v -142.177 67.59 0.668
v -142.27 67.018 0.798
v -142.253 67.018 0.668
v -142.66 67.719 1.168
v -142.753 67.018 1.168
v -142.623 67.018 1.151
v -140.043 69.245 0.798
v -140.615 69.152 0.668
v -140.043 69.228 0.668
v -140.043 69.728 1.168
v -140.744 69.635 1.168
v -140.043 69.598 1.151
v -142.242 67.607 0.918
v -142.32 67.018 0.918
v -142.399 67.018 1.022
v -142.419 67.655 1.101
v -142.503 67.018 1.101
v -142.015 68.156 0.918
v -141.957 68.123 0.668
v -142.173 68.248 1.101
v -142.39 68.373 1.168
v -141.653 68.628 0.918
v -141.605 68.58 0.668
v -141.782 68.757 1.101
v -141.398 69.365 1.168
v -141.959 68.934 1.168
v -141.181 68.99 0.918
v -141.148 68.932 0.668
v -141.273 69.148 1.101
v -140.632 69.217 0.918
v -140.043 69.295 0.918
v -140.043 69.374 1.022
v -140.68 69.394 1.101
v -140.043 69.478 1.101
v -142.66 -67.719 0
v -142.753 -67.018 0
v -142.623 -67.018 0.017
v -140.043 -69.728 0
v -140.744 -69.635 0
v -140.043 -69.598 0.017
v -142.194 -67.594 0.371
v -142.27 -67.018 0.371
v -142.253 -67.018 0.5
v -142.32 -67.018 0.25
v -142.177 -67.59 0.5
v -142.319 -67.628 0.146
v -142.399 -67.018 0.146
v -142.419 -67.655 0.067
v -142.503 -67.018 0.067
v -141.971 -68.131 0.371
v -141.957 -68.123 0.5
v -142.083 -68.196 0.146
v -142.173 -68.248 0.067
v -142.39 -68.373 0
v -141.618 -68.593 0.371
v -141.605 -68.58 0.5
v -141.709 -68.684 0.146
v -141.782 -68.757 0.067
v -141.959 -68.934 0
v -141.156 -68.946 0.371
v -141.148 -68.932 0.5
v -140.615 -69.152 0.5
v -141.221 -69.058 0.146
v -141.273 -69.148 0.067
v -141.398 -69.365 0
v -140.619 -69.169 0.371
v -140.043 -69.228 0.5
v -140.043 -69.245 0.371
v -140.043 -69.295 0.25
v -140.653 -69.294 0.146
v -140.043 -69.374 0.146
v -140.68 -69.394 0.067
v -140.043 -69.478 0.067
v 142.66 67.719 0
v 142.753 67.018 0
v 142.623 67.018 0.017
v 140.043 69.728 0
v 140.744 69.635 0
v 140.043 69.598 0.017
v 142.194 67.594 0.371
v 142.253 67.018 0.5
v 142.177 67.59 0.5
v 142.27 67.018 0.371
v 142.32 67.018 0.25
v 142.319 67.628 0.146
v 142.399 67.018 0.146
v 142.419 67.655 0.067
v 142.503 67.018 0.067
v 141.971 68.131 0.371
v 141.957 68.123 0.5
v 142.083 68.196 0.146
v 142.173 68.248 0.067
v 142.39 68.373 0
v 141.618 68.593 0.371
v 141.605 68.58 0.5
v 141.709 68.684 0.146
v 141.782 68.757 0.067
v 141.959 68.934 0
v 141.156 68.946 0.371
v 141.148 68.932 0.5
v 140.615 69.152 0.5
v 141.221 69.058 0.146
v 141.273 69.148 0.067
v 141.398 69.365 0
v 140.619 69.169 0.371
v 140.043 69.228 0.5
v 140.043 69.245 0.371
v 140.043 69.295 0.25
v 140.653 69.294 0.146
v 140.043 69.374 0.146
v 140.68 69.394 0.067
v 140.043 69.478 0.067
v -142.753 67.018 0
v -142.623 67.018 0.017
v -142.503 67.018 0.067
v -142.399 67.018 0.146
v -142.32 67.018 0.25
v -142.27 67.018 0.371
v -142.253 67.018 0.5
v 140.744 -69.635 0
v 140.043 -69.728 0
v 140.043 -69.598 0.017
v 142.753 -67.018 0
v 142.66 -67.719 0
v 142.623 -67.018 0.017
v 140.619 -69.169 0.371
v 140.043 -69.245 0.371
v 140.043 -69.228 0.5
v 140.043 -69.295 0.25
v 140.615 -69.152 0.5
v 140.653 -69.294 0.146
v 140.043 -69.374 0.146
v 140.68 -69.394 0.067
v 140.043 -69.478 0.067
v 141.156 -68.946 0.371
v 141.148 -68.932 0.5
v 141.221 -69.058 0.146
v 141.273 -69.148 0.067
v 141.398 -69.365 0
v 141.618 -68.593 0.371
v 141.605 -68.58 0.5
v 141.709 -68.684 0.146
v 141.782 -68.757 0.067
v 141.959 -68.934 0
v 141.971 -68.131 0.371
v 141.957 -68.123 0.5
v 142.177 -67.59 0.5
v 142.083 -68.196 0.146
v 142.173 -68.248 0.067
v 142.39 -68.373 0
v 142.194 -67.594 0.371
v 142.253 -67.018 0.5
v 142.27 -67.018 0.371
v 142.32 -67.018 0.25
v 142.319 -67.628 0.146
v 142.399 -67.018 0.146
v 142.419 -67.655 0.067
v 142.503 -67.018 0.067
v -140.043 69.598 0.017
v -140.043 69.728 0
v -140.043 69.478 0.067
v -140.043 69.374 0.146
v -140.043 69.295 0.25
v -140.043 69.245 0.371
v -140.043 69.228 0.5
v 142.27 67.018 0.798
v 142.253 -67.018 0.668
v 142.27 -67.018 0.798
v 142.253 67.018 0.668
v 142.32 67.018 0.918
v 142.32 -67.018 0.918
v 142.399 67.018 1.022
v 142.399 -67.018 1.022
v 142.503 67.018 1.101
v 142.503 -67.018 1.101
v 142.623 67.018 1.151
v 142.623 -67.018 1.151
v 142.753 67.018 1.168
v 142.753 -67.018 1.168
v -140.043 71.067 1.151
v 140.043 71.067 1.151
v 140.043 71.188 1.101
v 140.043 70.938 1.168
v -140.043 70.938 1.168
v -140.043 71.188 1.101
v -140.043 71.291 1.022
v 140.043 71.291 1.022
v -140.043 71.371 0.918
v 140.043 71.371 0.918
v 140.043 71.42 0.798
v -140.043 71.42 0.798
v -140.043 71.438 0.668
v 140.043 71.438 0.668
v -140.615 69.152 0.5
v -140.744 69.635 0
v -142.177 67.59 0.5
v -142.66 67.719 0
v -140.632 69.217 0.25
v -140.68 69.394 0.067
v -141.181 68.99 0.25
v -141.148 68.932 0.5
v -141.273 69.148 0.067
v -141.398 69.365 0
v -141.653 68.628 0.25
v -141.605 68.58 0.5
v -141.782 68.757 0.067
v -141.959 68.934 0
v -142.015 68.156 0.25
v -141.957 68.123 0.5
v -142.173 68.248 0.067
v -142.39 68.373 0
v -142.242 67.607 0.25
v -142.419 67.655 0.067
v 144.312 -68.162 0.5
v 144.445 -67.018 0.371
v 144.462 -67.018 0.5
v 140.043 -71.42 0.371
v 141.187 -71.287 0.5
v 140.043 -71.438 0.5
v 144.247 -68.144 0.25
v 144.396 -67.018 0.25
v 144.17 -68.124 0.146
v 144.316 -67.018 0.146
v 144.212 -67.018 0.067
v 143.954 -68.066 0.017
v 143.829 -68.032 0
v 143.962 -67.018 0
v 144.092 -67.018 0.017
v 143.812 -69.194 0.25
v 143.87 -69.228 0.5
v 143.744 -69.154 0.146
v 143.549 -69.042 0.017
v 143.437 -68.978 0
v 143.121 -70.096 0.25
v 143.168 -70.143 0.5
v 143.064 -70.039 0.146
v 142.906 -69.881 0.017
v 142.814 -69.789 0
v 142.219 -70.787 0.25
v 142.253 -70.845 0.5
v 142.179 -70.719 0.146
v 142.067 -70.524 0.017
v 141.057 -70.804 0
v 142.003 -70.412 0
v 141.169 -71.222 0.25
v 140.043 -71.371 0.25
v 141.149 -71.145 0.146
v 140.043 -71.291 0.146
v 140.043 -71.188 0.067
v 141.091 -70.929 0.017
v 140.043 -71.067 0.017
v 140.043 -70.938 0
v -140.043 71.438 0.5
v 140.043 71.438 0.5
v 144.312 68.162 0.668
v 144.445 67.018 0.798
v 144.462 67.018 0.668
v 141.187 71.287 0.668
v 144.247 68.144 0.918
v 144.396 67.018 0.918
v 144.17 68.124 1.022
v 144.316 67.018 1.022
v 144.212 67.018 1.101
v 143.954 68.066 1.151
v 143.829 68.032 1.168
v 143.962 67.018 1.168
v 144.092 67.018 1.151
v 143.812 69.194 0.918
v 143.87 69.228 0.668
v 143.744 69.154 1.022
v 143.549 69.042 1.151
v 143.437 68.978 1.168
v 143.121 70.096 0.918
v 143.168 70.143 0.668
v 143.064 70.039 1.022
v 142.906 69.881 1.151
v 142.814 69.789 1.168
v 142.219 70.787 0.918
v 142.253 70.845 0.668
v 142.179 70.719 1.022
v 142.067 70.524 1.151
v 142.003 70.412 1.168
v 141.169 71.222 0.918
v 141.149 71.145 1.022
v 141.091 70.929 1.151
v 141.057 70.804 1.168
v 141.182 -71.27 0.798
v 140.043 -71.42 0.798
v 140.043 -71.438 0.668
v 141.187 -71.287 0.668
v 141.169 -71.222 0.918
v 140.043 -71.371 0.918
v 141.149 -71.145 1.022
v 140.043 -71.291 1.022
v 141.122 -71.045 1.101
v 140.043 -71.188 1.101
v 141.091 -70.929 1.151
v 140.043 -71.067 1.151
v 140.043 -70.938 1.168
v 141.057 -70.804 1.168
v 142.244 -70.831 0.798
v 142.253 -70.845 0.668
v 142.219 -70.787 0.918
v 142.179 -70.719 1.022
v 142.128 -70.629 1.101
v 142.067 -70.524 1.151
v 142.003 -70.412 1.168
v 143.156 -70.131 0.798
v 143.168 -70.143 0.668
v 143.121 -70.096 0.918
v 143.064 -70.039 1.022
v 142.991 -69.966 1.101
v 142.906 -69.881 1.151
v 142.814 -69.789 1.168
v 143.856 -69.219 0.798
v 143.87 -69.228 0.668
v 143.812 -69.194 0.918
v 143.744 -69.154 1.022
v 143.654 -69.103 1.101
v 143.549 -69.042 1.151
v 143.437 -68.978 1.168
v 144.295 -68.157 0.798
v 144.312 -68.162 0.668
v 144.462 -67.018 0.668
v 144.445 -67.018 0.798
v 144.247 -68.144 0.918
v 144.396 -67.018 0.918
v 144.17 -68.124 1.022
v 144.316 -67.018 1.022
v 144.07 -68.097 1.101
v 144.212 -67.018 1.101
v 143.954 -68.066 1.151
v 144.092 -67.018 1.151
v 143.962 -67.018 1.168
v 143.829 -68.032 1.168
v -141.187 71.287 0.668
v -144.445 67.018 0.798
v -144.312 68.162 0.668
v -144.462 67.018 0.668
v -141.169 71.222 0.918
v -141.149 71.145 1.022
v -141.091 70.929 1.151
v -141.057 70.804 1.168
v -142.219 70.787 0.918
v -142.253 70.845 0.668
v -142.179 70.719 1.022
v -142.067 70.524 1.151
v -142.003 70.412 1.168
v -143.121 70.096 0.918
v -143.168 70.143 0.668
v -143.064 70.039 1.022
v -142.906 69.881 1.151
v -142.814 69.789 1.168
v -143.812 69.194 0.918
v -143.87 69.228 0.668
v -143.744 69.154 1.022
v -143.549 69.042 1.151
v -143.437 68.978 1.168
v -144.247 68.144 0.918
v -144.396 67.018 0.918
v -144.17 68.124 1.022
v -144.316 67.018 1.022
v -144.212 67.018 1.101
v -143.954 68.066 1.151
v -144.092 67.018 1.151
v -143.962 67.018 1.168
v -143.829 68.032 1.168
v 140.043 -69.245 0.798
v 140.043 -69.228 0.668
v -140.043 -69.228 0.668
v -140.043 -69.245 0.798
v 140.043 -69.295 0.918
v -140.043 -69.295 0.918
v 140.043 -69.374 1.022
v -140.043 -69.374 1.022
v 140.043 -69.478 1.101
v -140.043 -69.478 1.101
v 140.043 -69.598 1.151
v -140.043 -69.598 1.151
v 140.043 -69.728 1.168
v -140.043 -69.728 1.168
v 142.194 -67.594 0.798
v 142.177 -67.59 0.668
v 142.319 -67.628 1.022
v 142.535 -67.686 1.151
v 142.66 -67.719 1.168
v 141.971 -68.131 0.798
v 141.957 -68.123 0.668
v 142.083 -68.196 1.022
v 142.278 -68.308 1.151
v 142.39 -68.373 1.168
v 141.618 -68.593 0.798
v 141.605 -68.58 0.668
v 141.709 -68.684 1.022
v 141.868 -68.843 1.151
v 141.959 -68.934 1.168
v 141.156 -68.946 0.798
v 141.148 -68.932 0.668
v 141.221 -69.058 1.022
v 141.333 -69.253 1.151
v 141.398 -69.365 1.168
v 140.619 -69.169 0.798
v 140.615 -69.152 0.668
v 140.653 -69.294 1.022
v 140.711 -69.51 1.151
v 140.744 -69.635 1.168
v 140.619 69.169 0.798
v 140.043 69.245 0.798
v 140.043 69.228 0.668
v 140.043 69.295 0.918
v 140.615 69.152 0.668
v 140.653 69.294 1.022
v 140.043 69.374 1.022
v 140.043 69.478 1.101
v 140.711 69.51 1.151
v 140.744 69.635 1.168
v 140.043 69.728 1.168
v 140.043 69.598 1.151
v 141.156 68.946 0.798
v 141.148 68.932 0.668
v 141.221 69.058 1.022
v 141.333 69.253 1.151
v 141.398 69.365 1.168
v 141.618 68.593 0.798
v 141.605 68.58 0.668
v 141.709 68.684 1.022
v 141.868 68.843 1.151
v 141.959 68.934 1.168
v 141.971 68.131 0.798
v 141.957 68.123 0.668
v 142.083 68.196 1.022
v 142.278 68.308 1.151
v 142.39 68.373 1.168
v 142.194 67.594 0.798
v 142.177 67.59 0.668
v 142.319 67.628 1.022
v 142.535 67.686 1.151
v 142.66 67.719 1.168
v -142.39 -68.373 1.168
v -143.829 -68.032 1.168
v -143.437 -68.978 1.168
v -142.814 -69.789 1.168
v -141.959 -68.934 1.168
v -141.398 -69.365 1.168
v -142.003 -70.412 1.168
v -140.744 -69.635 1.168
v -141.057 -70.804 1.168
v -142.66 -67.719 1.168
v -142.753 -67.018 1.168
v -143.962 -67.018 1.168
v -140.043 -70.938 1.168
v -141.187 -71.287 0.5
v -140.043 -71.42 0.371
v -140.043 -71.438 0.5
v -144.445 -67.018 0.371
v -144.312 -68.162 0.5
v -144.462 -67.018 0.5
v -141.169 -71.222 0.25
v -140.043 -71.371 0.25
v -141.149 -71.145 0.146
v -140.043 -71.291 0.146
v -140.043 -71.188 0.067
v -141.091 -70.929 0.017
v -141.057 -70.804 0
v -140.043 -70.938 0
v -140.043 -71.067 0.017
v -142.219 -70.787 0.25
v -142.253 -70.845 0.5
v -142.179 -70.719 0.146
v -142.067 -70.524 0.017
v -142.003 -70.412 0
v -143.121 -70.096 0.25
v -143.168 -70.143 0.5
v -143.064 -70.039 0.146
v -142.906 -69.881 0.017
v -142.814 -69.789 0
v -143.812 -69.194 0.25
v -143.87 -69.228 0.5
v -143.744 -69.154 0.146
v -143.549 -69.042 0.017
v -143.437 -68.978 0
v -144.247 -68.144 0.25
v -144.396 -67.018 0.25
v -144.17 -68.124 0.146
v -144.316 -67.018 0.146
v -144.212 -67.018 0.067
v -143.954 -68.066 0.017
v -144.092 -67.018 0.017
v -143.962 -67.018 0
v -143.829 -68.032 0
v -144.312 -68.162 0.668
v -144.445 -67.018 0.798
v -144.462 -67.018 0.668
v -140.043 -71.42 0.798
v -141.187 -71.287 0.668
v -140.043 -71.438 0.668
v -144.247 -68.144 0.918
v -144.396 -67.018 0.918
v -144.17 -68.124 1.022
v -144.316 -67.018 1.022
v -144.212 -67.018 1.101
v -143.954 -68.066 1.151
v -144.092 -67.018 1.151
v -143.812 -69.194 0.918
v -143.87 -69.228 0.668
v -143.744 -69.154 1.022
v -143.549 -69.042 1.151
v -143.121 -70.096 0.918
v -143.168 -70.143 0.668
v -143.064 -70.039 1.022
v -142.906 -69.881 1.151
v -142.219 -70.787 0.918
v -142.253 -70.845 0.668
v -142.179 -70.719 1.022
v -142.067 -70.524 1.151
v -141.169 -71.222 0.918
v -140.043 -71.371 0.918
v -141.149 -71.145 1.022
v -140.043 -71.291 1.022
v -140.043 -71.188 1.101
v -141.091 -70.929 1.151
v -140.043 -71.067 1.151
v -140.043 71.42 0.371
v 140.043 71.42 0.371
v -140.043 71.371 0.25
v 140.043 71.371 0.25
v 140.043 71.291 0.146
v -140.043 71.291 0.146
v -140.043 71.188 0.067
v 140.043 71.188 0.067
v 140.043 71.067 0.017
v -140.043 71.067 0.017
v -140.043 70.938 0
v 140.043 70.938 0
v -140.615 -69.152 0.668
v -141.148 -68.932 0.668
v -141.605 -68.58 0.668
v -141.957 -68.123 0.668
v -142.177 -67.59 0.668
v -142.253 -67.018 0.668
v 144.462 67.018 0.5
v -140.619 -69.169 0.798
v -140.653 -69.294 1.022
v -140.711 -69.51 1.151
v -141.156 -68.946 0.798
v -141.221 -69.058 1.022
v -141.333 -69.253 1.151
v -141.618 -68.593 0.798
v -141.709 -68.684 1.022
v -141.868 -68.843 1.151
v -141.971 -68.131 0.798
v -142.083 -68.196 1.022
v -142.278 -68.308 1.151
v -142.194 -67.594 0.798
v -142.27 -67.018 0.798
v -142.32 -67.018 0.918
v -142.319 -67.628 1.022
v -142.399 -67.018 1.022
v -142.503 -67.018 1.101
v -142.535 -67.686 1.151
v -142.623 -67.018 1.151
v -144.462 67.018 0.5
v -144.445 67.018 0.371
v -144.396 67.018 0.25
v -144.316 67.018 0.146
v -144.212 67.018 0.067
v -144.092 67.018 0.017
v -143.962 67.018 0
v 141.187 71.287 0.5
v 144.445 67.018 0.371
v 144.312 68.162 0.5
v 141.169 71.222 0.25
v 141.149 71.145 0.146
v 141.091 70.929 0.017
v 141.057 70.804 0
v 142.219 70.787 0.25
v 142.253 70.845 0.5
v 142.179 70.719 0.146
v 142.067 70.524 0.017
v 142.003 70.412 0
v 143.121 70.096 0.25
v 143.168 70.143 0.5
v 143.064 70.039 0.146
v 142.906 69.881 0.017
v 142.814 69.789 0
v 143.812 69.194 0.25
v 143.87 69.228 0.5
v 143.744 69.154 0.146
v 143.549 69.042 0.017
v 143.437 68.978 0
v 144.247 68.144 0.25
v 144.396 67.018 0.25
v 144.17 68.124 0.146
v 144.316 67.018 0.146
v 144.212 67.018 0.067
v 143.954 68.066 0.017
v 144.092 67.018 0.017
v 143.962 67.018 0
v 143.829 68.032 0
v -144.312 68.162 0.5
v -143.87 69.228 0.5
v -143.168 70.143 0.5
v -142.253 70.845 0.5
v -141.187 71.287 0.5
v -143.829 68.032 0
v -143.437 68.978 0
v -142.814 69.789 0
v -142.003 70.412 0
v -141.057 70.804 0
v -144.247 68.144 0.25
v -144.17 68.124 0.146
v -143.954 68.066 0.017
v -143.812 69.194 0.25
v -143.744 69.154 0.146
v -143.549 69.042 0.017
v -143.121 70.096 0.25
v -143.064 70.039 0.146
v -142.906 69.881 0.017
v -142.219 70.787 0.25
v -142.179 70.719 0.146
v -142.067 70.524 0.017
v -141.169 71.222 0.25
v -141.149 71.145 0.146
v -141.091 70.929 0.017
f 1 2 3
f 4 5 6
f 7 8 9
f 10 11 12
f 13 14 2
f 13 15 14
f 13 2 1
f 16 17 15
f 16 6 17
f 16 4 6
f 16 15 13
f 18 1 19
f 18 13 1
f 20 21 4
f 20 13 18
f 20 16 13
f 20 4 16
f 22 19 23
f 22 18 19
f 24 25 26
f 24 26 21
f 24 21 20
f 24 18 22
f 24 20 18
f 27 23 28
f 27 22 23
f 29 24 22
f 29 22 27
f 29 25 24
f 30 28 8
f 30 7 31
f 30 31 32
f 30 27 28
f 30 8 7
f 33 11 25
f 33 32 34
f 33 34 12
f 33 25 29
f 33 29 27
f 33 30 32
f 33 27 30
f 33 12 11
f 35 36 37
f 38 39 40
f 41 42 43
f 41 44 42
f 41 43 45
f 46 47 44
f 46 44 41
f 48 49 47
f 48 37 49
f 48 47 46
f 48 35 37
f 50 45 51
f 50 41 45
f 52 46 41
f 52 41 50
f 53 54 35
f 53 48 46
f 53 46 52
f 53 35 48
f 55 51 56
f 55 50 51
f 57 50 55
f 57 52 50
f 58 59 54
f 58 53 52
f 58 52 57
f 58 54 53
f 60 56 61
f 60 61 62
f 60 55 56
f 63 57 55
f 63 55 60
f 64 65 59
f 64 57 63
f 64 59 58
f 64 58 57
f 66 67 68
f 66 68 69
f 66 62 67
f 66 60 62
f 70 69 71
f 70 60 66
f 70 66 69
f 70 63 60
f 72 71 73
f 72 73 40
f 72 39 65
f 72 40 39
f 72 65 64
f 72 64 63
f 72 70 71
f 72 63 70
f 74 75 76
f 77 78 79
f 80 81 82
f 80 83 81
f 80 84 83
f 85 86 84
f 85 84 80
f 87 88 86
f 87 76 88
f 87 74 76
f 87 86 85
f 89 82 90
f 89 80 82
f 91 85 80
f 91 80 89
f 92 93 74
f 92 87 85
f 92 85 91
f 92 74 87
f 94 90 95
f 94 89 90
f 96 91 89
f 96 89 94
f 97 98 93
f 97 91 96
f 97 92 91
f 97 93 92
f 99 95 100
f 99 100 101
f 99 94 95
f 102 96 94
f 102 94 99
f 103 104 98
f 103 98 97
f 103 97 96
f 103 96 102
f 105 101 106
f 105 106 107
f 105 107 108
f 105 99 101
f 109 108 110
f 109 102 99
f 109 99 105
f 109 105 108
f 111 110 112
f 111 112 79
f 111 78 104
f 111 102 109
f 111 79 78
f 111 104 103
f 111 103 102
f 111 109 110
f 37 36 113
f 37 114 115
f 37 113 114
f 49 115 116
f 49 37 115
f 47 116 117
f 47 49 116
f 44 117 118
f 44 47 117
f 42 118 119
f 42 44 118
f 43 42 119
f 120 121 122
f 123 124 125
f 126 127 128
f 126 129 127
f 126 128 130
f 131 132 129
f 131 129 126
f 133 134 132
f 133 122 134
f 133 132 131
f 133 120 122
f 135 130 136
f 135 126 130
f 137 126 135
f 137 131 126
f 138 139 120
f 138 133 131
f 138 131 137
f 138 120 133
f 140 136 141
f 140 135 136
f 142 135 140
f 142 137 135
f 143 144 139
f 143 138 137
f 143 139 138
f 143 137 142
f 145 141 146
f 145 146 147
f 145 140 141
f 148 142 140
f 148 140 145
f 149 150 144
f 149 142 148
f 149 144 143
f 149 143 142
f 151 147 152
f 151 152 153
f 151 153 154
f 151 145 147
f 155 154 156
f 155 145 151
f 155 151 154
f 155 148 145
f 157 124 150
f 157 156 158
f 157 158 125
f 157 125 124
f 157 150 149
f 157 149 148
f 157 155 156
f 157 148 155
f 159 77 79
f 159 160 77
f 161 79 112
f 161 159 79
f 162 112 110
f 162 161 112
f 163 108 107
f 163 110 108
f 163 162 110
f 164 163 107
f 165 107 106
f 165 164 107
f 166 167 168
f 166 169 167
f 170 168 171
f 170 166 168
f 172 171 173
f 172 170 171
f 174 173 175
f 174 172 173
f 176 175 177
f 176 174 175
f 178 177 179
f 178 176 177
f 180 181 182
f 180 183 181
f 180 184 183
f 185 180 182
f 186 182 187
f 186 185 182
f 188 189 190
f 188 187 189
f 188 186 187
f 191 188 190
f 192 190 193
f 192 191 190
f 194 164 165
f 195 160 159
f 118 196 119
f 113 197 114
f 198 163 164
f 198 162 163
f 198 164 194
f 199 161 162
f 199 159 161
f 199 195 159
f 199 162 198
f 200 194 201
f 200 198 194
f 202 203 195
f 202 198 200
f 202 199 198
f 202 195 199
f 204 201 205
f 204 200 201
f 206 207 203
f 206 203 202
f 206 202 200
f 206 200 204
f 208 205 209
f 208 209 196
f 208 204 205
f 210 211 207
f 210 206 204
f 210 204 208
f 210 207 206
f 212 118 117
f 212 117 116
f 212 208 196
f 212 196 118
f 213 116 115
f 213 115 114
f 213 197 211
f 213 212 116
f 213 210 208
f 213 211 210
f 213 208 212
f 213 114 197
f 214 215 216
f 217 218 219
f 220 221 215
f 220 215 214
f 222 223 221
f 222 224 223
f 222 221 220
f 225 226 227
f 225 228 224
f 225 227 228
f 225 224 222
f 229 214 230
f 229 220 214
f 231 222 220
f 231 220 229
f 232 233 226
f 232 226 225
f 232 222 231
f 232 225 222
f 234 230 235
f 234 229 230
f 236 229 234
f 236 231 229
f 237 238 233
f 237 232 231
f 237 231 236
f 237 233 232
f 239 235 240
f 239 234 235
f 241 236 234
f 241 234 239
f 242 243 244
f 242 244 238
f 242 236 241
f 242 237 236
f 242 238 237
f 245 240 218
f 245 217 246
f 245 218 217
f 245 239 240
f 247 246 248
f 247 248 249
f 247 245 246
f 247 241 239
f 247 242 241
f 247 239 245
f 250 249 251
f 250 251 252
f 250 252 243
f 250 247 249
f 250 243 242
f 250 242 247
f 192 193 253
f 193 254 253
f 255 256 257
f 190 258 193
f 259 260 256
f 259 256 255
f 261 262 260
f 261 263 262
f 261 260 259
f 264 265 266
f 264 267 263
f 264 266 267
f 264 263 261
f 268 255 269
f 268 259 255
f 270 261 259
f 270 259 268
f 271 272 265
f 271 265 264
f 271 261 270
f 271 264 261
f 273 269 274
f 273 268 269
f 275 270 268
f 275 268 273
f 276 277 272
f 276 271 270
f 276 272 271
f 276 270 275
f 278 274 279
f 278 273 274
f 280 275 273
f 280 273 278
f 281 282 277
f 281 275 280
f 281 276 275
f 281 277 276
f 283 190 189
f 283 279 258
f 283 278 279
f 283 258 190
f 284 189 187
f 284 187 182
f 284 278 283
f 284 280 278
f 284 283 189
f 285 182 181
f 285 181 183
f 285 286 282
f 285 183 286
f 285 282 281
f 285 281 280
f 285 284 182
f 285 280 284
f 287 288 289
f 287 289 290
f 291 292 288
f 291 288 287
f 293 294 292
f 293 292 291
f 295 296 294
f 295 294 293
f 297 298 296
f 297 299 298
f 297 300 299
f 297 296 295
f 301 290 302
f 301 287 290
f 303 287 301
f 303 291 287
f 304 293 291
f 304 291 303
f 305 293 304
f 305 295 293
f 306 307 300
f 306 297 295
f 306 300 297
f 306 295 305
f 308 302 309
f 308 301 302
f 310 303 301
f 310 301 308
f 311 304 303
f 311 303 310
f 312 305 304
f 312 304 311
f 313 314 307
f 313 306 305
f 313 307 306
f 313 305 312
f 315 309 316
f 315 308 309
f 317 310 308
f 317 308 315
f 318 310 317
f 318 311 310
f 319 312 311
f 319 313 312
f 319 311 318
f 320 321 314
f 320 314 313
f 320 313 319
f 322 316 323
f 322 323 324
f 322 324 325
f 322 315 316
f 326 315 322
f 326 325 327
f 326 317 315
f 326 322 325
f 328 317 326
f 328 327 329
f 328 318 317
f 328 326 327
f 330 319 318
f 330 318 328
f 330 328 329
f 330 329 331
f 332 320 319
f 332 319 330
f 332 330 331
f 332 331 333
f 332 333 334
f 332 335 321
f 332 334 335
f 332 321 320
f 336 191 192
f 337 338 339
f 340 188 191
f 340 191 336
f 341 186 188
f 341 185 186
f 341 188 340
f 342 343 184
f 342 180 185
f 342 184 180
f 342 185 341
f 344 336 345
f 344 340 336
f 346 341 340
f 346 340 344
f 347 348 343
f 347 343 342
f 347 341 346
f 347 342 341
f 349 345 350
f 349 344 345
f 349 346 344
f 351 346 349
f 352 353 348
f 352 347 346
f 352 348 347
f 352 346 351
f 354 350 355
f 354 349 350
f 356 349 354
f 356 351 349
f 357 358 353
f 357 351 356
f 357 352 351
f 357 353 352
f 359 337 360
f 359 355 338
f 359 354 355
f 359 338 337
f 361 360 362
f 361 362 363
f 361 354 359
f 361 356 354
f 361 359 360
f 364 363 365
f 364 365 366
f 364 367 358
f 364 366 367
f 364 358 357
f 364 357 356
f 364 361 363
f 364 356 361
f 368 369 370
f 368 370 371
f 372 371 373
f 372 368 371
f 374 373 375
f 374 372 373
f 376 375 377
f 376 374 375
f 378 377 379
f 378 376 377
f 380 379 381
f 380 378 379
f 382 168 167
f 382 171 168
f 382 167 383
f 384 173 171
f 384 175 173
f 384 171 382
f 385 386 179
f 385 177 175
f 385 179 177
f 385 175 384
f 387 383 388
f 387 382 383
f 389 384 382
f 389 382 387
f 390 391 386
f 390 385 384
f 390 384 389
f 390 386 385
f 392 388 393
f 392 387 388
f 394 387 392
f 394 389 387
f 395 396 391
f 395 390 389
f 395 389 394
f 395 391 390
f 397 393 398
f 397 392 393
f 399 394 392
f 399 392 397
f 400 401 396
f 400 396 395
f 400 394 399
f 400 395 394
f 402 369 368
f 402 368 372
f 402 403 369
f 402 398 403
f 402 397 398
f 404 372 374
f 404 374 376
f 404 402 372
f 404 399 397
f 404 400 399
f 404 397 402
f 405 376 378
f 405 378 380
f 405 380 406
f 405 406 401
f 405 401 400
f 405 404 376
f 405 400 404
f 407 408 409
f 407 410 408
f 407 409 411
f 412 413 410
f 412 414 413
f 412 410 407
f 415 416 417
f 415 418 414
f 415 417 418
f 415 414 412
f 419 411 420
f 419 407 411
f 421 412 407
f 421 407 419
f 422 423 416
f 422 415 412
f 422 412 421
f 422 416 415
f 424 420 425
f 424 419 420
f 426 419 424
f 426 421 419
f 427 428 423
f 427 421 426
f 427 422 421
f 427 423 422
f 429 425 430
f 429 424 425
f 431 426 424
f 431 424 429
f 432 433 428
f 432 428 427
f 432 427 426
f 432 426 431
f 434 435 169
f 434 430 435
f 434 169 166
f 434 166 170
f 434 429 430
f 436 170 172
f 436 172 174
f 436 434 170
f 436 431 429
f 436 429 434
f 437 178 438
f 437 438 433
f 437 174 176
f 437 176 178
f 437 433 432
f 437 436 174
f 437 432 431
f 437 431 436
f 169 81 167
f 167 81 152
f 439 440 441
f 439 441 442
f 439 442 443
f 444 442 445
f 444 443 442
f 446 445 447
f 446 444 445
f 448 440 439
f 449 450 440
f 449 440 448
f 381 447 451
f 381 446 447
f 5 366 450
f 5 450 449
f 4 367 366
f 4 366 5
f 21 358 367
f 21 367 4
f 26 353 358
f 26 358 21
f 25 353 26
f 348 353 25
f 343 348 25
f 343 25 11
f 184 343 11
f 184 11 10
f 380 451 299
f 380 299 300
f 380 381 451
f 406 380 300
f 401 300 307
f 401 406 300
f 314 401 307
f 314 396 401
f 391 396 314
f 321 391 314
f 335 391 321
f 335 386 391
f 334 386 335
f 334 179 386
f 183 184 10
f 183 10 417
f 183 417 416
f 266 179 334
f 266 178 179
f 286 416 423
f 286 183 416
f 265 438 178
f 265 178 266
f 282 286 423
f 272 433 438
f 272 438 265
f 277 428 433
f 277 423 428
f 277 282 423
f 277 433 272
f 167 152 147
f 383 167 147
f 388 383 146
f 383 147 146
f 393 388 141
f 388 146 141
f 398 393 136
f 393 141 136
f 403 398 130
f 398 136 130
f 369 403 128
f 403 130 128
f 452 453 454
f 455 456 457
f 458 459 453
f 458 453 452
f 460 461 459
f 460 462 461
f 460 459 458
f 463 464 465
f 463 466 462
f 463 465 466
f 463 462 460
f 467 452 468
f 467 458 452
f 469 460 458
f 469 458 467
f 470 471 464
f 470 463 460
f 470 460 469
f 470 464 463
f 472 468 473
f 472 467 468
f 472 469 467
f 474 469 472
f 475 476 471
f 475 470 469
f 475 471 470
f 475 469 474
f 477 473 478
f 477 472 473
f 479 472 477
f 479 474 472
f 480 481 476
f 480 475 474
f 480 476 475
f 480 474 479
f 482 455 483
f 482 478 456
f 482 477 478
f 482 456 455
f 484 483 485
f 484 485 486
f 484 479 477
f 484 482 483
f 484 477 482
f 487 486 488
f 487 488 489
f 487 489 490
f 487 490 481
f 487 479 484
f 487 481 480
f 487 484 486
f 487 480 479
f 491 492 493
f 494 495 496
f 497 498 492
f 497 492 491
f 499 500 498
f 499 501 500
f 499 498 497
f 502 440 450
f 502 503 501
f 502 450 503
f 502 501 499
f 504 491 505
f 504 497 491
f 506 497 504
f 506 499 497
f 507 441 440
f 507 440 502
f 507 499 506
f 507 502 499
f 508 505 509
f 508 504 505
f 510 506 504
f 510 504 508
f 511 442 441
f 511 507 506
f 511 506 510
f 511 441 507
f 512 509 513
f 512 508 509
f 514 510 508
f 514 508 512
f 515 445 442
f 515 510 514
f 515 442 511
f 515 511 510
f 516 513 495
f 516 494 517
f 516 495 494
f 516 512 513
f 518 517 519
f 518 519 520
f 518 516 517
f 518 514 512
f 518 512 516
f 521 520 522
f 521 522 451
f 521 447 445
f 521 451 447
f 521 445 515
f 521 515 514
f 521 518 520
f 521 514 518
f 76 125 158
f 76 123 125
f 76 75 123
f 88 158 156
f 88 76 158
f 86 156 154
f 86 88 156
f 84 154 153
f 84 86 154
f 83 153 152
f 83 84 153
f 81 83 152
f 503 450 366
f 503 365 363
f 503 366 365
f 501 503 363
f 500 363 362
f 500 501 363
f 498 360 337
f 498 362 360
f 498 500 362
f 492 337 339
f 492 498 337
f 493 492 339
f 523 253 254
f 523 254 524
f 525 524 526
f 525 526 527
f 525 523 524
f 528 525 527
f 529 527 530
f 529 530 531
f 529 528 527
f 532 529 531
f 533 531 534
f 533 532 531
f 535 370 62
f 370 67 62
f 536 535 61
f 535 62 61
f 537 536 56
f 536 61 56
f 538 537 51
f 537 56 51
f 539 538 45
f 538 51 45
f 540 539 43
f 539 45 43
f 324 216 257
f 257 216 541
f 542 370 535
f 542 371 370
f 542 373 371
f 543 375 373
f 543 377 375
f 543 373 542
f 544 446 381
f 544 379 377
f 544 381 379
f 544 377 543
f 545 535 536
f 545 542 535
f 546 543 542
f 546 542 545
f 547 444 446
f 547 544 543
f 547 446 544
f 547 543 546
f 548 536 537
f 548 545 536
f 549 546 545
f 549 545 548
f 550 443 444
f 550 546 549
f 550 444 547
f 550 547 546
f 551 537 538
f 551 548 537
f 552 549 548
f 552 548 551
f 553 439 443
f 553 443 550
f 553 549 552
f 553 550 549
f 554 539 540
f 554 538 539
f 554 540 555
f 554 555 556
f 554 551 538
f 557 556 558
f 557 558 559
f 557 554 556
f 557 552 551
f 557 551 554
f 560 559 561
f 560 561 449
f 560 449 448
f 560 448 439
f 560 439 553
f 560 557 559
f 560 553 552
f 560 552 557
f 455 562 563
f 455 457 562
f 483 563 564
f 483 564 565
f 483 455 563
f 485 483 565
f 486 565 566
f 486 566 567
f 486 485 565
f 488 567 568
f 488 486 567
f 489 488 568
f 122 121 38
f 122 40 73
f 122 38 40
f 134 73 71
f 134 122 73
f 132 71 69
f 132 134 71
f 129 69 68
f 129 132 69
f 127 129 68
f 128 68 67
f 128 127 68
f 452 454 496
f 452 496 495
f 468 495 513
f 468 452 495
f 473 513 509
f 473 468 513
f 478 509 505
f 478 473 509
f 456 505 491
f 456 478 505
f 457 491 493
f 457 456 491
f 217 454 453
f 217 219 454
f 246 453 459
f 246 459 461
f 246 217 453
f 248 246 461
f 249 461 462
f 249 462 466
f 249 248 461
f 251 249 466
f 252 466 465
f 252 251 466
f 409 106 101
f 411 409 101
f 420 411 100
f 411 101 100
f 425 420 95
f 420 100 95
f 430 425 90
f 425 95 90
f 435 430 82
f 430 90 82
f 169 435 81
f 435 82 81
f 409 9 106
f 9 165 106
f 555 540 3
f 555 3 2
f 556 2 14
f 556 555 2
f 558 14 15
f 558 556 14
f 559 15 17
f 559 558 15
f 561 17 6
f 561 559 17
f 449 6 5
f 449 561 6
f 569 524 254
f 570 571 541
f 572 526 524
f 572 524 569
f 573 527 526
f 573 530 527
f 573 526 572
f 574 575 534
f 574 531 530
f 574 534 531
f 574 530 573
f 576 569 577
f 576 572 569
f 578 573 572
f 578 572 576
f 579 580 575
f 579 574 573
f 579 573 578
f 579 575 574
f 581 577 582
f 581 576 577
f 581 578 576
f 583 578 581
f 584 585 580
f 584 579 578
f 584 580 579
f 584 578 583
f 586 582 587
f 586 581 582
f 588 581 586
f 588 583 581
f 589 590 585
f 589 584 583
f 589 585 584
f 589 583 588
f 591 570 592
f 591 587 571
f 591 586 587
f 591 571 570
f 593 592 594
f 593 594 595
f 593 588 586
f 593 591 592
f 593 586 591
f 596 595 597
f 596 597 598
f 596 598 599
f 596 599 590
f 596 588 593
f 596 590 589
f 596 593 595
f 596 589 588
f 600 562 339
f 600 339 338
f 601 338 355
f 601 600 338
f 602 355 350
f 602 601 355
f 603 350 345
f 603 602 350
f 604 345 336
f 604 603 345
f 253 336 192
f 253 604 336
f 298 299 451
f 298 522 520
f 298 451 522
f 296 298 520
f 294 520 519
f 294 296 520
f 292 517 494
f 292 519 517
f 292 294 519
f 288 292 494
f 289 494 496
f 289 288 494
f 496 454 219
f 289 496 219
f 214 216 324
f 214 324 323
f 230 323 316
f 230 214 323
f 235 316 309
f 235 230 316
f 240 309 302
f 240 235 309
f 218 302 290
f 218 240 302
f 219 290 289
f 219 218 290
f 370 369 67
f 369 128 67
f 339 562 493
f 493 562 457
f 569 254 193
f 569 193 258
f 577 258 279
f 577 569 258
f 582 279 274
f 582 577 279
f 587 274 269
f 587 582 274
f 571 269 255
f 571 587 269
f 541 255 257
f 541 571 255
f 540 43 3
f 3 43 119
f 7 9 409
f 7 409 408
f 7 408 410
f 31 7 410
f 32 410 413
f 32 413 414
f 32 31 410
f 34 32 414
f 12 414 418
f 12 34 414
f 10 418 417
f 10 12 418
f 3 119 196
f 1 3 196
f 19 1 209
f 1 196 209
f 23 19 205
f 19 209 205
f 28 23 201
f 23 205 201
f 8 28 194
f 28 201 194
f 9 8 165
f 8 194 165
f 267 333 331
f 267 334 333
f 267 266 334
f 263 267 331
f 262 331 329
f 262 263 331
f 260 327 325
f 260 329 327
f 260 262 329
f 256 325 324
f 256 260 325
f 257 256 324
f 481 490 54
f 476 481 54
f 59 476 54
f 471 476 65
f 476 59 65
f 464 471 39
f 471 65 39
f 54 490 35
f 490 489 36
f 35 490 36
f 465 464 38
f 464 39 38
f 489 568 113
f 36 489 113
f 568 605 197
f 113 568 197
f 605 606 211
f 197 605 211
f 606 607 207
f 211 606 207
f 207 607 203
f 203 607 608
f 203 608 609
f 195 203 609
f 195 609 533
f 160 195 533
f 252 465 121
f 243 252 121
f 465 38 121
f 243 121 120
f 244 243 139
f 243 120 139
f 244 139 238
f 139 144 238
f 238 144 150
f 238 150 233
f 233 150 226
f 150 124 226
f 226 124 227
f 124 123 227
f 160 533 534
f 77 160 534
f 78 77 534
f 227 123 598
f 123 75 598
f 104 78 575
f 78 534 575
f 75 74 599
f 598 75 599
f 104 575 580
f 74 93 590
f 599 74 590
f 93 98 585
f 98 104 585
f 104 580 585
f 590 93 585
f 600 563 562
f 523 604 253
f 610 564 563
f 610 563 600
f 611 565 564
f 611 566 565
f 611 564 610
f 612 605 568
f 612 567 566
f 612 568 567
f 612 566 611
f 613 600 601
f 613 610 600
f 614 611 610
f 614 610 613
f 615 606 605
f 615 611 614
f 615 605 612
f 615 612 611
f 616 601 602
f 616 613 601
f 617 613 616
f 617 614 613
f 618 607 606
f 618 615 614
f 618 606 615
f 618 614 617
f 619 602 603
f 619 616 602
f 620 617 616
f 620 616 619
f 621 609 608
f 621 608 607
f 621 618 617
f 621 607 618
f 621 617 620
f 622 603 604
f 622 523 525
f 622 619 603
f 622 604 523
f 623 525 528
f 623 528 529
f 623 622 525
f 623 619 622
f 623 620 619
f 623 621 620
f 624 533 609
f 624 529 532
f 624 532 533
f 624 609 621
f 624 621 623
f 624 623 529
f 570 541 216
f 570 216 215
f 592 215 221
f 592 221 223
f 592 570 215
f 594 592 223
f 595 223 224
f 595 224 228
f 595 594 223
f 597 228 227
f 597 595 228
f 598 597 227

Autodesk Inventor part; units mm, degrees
ref_plane "YZ Plane" through (0, 0, 0) normal (1, 0, 0) x (0, 1, 0)
ref_plane "XZ Plane" through (0, 0, 0) normal (0, 1, 0) x (-1, 0, 0)
ref_plane "XY Plane" through (0, 0, 0) normal (0, 0, 1) x (1, 0, 0)
sketch "Sketch1" plane through (0, 0, 0) normal (0, 0, 1) x (1, 0, 0)
  line L0 (146.05, -73.025) -> (-146.05, -73.025)
  line L1 (-146.05, -73.025) -> (-146.05, 73.025)
  line L2 (-146.05, 73.025) -> (146.05, 73.025)
  line L3 (146.05, 73.025) -> (146.05, -73.025)
  line L4 (146.05, -73.025) -> (-146.05, 73.025) construction
  line L5 (-146.05, -73.025) -> (146.05, 73.025) construction
  line L6 (-144.4625, 67.0179) -> (-144.4625, -67.0179)
  line L7 (-140.0429, -71.4375) -> (140.0429, -71.4375)
  line L8 (144.4625, -67.0179) -> (144.4625, 67.0179)
  line L9 (140.0429, 71.4375) -> (-140.0429, 71.4375)
  line L10 (-142.2527, -67.0179) -> (-142.2527, 67.0179)
  line L11 (-140.0429, 69.2277) -> (140.0429, 69.2277)
  line L12 (142.2527, 67.0179) -> (142.2527, -67.0179)
  line L13 (140.0429, -69.2277) -> (-140.0429, -69.2277)
  arc A0 (-142.2527, -67.0179) -> (-140.0429, -69.2277) centre (-140.0429, -67.0179) ccw
  arc A1 (140.0429, -69.2277) -> (142.2527, -67.0179) centre (140.0429, -67.0179) ccw
  arc A2 (142.2527, 67.0179) -> (140.0429, 69.2277) centre (140.0429, 67.0179) ccw
  arc A3 (-140.0429, 69.2277) -> (-142.2527, 67.0179) centre (-140.0429, 67.0179) ccw
  arc A4 (-144.4625, -67.0179) -> (-140.0429, -71.4375) centre (-140.0429, -67.0179) ccw
  arc A5 (140.0429, -71.4375) -> (144.4625, -67.0179) centre (140.0429, -67.0179) ccw
  arc A6 (144.4625, 67.0179) -> (140.0429, 71.4375) centre (140.0429, 67.0179) ccw
  arc A7 (-140.0429, 71.4375) -> (-144.4625, 67.0179) centre (-140.0429, 67.0179) ccw
  point P0 (0, 0)
  dimension "d0" = 292.1
  dimension "d1" = 146.05
  dimension "d2" = 1.5875
  dimension "d3" = 2.2098
  dimension "d4" = 2.2098
  dimension "d5" = 4.4196
extrude "Extrusion1" add sketch "Sketch1" along normal blind 1.1684 contours A7 L9 A6 L8 A5 L7 A4 L6
fillet "Fillet1" radius 0.5 32 edges at (-141.6055, 68.5805, 1.1684) (0, 69.2277, 1.1684) (141.6055, 68.5805, 1.1684) (142.2527, 0, 1.1684) (141.6055, -68.5805, 1.1684) (0, -69.2277, 1.1684) (-141.6055, -68.5805, 1.1684) (-142.2527, 0, 1.1684) (-141.6055, 68.5805, 0) (-142.2527, 0, 0) (-141.6055, -68.5805, 0) (0, -69.2277, 0) (141.6055, -68.5805, 0) (142.2527, 0, 0) (141.6055, 68.5805, 0) (0, 69.2277, 0) (-144.4625, 0, 1.1684) (-143.168, -70.143, 1.1684) (0, -71.4375, 1.1684) (143.168, -70.143, 1.1684) (144.4625, 0, 1.1684) (143.168, 70.143, 1.1684) (0, 71.4375, 1.1684) (-143.168, 70.143, 1.1684) (-144.4625, 0, 0) (-143.168, 70.143, 0) (0, 71.4375, 0) (143.168, 70.143, 0) (144.4625, 0, 0) (143.168, -70.143, 0) (0, -71.4375, 0) (-143.168, -70.143, 0)
equation "\"d0\" = depth + 2 * frameAcrylicThickness"
equation "\"d1\" = width + 2 * frameAcrylicThickness"
equation "\"frameAcrylicThickness\" = 9.525"
equation "\"width\" = 127"
equation "\"depth\" = 273.05"
equation "\"internalAcrylicThickness\" = 6.35"
equation "\"height\" = 127"
equation "\"mirrorAngle\" = 5deg"
equation "\"detectorWidth\" = 52"
equation "\"detectorHeight\" = 52"
equation "\"mirrorThickness\" = 3.175"
equation "\"fresnelThickness\" = 0.1"
equation "\"focalLength\" = 76.2"
equation "\"ior\" = 1.49"
equation "\"centerThickness\" = 1.524"
equation "\"fresnelAngle\" = 90deg"
equation "\"fresnelEffectiveDiameter\" = 152.4"
equation "\"oRingWidth\" = 1.5875"
equation "\"sensorHolderDepth\" = 19.05"
equation "\"aerogelClearence\" = 3.175"
equation "\"backplanePCBHeight\" = 76.2"
equation "\"backplanePCBWidth\" = 76.2"
equation "\"backplaneHoleOffsett\" = 6.35"
equation "\"backplanePostionOffsett\" = 12.7"
equation "\"moduleSlotClearence\" = 0.79375"
properties part number "topORing" material "Rubber"
